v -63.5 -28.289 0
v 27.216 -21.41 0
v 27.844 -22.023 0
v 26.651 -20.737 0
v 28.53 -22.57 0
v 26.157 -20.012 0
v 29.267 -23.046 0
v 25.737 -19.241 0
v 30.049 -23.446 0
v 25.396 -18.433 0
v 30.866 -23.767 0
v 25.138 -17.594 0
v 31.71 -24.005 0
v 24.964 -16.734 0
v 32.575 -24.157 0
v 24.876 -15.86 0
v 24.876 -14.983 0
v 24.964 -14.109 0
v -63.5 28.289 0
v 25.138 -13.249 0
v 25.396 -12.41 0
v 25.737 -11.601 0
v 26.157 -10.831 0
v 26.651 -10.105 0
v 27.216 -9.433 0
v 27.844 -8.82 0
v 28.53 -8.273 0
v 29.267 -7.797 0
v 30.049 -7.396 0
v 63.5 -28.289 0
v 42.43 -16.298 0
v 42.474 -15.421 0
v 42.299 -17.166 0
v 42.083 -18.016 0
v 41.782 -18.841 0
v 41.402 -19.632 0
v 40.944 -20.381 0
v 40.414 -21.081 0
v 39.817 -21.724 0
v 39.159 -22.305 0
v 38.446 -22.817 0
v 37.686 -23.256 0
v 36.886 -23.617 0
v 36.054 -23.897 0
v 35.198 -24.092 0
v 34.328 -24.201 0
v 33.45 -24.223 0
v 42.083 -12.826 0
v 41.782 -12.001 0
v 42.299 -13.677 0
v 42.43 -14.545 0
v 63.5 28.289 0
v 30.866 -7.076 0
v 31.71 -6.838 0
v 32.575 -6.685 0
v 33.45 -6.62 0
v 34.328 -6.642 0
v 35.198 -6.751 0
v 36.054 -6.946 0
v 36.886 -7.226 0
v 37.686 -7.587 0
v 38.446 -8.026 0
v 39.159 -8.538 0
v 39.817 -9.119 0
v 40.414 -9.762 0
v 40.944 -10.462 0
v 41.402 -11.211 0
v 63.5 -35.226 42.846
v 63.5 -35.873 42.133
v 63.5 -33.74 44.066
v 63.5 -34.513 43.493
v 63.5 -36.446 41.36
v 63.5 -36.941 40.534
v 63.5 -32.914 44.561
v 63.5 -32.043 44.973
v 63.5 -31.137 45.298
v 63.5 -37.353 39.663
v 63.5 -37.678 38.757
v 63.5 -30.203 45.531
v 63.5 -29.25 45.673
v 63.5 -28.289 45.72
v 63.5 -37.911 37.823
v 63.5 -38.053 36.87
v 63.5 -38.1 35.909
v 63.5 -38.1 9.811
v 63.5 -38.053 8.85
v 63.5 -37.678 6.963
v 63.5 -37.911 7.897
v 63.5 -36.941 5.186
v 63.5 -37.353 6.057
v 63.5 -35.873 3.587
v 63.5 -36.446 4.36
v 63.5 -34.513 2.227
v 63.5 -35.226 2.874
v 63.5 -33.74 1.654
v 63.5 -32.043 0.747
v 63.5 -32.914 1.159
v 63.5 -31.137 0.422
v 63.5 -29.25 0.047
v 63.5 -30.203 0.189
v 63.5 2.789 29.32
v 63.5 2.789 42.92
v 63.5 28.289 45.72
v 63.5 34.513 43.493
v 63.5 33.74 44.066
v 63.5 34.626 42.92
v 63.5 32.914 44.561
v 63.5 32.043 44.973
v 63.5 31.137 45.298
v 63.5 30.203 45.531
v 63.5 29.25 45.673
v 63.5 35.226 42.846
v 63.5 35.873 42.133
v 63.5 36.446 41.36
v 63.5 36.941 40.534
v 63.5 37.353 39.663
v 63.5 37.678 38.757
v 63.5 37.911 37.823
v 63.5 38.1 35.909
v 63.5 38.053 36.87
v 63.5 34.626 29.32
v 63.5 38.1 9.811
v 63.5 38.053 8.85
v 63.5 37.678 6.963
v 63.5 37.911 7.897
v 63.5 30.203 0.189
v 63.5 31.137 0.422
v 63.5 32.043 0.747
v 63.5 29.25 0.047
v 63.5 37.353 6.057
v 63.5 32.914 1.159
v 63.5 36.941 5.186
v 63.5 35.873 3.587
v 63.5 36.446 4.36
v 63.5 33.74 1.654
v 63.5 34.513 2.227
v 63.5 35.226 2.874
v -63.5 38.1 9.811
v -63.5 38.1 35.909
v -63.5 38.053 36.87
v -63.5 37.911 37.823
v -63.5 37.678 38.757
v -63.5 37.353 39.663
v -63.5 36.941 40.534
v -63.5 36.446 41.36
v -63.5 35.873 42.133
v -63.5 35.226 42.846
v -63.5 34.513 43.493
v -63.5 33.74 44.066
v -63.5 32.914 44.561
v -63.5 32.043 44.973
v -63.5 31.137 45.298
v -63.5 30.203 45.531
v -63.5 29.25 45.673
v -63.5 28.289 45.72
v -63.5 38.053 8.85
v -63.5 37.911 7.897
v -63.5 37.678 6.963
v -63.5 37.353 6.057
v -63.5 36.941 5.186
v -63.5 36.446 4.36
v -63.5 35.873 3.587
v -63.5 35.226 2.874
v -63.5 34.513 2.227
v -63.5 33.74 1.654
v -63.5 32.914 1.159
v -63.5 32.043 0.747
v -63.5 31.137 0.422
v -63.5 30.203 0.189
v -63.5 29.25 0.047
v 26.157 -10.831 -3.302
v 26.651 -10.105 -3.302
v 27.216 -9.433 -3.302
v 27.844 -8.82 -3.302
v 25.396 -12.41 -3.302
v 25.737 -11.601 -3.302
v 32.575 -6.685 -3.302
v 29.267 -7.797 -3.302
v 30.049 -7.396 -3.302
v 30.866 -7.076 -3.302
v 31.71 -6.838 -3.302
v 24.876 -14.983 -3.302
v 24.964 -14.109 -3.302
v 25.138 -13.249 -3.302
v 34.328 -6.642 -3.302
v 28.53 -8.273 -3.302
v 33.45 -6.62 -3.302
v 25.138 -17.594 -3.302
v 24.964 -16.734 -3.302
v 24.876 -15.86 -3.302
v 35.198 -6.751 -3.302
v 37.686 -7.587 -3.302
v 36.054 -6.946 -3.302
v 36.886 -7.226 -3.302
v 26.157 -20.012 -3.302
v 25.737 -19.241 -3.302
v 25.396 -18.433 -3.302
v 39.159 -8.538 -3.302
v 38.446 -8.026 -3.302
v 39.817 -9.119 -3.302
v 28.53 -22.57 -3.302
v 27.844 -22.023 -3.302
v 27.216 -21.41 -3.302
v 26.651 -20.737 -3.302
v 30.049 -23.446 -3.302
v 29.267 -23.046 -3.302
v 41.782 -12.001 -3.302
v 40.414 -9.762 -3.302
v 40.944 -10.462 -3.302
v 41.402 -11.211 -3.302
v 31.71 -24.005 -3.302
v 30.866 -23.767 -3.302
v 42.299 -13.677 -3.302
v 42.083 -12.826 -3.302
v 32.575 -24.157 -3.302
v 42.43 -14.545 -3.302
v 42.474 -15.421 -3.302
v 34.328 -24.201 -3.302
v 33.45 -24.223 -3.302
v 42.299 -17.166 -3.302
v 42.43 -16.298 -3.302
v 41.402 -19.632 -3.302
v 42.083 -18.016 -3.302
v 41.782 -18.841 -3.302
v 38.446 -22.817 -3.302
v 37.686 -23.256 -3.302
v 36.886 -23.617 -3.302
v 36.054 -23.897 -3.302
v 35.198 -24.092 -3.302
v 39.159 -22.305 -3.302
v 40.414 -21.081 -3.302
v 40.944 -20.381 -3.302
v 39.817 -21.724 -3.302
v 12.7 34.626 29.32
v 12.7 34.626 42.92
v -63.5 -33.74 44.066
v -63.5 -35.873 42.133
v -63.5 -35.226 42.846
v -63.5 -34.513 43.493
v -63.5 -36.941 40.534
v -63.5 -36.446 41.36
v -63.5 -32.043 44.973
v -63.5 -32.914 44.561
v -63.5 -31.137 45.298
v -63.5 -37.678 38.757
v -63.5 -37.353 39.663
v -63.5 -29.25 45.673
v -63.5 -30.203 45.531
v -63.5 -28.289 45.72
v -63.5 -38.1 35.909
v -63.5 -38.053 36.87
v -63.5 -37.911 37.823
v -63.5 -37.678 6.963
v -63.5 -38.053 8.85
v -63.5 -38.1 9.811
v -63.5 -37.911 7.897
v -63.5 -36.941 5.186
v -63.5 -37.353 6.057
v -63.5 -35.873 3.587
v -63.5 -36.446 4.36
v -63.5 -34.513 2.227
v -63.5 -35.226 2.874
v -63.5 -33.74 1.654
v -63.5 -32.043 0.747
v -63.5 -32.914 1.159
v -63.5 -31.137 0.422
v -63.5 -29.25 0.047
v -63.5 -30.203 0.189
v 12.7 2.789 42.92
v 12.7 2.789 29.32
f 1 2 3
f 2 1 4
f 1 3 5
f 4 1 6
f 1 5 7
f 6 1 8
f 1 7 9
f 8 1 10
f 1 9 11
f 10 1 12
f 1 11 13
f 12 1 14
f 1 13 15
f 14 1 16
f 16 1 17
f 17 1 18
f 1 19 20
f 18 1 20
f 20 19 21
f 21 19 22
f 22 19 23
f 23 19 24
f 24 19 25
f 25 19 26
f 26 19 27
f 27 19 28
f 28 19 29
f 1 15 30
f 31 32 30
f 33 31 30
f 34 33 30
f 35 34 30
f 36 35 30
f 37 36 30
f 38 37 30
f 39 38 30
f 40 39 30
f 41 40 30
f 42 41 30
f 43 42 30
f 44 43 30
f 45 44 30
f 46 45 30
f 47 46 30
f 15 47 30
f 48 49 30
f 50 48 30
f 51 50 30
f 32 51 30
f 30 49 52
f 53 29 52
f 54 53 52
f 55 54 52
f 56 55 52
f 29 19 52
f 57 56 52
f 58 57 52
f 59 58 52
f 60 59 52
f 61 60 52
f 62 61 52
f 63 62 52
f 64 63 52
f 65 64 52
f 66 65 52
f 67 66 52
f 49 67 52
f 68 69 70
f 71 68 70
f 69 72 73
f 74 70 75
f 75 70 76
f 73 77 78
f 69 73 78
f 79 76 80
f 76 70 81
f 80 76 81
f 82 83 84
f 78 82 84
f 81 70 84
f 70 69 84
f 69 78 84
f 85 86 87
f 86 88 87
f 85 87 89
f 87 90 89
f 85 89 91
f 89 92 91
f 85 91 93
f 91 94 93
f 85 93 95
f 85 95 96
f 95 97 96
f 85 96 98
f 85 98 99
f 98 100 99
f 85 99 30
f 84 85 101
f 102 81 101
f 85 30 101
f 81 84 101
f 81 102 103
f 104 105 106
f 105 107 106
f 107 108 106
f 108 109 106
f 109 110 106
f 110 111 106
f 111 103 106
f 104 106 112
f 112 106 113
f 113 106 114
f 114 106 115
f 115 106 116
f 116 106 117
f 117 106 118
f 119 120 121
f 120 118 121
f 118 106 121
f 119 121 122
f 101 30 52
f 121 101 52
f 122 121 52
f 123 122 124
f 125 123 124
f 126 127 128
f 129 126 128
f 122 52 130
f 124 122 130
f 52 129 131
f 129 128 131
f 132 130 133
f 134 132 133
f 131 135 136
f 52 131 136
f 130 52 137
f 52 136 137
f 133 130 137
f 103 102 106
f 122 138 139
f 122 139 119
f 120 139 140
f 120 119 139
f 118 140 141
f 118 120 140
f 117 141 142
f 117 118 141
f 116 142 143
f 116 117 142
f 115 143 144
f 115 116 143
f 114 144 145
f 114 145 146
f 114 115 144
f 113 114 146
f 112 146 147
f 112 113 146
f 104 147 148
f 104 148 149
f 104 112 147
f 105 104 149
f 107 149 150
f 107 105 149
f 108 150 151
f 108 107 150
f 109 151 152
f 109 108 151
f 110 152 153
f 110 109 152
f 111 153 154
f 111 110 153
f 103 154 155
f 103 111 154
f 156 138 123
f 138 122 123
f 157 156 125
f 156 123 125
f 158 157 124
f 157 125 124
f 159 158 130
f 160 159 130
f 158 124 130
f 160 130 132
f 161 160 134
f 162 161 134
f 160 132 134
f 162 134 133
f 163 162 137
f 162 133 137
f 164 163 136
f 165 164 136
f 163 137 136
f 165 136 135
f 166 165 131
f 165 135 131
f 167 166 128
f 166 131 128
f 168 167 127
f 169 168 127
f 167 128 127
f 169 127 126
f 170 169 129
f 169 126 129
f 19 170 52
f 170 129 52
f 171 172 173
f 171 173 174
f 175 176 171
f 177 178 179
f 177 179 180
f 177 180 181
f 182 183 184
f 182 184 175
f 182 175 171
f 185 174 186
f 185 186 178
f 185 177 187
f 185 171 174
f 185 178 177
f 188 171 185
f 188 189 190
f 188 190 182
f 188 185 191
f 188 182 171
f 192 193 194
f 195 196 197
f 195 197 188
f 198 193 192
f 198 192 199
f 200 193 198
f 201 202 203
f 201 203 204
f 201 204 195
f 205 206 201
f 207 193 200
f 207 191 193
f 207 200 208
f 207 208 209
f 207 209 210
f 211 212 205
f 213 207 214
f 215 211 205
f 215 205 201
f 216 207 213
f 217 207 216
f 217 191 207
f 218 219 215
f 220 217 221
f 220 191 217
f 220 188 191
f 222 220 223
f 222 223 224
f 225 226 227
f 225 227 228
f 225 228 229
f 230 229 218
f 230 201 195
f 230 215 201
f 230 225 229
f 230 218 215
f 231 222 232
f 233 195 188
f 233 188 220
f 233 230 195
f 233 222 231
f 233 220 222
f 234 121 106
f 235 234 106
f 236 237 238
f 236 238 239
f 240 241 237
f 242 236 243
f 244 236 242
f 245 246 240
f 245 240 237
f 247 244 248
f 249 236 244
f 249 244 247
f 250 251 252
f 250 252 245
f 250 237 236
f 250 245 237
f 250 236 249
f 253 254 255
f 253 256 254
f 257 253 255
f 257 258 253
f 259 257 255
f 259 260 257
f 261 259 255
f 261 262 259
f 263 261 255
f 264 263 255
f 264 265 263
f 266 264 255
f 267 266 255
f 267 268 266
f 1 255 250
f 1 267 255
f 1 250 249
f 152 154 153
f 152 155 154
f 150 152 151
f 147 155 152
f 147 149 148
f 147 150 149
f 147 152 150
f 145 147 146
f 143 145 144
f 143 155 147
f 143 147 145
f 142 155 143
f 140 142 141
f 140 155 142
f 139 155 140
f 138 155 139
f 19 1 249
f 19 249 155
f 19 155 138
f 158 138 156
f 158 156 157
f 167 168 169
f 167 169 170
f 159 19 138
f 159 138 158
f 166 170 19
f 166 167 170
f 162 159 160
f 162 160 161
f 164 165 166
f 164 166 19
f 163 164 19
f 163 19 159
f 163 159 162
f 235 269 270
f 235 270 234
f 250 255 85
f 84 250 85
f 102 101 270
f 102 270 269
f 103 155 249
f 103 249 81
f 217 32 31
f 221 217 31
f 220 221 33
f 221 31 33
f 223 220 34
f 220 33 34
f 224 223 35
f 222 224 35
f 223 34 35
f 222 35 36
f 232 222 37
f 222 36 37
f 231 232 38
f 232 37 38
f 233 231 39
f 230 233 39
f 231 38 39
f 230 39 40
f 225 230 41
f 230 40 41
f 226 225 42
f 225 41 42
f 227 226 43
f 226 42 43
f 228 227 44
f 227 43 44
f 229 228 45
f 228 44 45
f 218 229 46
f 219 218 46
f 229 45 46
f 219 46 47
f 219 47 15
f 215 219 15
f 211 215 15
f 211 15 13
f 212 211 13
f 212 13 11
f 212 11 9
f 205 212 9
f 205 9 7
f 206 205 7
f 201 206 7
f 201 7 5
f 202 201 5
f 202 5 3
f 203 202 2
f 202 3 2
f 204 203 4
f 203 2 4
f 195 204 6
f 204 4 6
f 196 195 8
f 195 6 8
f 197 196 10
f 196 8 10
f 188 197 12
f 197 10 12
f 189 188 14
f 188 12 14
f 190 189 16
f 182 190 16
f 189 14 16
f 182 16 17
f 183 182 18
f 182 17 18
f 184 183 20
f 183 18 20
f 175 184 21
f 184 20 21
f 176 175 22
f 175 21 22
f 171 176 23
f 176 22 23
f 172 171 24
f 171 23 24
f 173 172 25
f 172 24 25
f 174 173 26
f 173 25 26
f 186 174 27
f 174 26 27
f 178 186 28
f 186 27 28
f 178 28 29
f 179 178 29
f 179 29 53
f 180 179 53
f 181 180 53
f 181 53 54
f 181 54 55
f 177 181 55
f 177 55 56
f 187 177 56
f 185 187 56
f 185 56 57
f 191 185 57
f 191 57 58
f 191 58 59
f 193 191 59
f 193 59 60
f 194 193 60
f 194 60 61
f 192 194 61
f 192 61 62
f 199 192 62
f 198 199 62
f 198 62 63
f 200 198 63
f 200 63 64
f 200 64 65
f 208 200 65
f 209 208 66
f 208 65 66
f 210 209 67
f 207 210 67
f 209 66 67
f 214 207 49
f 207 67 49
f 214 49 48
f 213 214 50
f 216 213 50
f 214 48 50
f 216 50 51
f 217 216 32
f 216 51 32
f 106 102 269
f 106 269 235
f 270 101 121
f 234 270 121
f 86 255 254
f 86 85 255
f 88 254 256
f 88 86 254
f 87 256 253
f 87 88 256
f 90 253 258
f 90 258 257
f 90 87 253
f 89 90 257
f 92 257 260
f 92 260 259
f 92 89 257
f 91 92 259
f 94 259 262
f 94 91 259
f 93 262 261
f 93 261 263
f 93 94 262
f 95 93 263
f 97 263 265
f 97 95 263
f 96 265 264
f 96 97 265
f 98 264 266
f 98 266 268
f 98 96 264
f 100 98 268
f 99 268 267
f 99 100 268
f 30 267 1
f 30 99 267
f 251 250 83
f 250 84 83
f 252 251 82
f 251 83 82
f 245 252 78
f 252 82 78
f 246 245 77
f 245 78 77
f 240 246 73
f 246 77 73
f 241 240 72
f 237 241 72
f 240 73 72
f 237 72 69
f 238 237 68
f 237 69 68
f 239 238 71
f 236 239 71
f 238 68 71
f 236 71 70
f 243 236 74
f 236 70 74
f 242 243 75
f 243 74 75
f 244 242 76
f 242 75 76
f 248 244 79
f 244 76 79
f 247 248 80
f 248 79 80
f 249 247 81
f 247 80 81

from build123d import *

# Parameters (mm, degrees)
F0_W     = 127
F0_H     = 76.2
F1_DEPTH = 45.72
F2_R     = 9.811364
F3_R     = 8.804224
F4_DEPTH = 3.302
F5_W     = 31.836366
F5_H     = 13.6
F6_DEPTH = 50.8


with BuildPart() as f1:
    # F0 (on Top) → F1 (new body)
    with BuildSketch(Plane.XY):
        Rectangle(F0_W, F0_H)
    extrude(amount=F1_DEPTH)

    # F2
    f2_edges = [f1.edges().sort_by_distance(p)[0] for p in [
        (0, -38.1, 45.72),
        (0, 38.1, 45.72),
        (0, -38.1, 0),
        (0, 38.1, 0),
    ]]
    fillet(f2_edges, radius=F2_R)

    # F3 (on face) → F4 (join)
    with BuildSketch(Plane(origin=(0, 0, 0), x_dir=(1, 0, 0), z_dir=(0, 0, -1))):
        with Locations((33.669599, 15.421356)):
            Circle(F3_R)
    extrude(amount=F4_DEPTH)

    # F5 (on face) → F6 (cut)
    with BuildSketch(Plane.YZ.offset(63.5)):
        with Locations((18.707377, 36.119621)):
            Rectangle(F5_W, F5_H)
    extrude(amount=-F6_DEPTH, mode=Mode.SUBTRACT)


solid = f1.part
